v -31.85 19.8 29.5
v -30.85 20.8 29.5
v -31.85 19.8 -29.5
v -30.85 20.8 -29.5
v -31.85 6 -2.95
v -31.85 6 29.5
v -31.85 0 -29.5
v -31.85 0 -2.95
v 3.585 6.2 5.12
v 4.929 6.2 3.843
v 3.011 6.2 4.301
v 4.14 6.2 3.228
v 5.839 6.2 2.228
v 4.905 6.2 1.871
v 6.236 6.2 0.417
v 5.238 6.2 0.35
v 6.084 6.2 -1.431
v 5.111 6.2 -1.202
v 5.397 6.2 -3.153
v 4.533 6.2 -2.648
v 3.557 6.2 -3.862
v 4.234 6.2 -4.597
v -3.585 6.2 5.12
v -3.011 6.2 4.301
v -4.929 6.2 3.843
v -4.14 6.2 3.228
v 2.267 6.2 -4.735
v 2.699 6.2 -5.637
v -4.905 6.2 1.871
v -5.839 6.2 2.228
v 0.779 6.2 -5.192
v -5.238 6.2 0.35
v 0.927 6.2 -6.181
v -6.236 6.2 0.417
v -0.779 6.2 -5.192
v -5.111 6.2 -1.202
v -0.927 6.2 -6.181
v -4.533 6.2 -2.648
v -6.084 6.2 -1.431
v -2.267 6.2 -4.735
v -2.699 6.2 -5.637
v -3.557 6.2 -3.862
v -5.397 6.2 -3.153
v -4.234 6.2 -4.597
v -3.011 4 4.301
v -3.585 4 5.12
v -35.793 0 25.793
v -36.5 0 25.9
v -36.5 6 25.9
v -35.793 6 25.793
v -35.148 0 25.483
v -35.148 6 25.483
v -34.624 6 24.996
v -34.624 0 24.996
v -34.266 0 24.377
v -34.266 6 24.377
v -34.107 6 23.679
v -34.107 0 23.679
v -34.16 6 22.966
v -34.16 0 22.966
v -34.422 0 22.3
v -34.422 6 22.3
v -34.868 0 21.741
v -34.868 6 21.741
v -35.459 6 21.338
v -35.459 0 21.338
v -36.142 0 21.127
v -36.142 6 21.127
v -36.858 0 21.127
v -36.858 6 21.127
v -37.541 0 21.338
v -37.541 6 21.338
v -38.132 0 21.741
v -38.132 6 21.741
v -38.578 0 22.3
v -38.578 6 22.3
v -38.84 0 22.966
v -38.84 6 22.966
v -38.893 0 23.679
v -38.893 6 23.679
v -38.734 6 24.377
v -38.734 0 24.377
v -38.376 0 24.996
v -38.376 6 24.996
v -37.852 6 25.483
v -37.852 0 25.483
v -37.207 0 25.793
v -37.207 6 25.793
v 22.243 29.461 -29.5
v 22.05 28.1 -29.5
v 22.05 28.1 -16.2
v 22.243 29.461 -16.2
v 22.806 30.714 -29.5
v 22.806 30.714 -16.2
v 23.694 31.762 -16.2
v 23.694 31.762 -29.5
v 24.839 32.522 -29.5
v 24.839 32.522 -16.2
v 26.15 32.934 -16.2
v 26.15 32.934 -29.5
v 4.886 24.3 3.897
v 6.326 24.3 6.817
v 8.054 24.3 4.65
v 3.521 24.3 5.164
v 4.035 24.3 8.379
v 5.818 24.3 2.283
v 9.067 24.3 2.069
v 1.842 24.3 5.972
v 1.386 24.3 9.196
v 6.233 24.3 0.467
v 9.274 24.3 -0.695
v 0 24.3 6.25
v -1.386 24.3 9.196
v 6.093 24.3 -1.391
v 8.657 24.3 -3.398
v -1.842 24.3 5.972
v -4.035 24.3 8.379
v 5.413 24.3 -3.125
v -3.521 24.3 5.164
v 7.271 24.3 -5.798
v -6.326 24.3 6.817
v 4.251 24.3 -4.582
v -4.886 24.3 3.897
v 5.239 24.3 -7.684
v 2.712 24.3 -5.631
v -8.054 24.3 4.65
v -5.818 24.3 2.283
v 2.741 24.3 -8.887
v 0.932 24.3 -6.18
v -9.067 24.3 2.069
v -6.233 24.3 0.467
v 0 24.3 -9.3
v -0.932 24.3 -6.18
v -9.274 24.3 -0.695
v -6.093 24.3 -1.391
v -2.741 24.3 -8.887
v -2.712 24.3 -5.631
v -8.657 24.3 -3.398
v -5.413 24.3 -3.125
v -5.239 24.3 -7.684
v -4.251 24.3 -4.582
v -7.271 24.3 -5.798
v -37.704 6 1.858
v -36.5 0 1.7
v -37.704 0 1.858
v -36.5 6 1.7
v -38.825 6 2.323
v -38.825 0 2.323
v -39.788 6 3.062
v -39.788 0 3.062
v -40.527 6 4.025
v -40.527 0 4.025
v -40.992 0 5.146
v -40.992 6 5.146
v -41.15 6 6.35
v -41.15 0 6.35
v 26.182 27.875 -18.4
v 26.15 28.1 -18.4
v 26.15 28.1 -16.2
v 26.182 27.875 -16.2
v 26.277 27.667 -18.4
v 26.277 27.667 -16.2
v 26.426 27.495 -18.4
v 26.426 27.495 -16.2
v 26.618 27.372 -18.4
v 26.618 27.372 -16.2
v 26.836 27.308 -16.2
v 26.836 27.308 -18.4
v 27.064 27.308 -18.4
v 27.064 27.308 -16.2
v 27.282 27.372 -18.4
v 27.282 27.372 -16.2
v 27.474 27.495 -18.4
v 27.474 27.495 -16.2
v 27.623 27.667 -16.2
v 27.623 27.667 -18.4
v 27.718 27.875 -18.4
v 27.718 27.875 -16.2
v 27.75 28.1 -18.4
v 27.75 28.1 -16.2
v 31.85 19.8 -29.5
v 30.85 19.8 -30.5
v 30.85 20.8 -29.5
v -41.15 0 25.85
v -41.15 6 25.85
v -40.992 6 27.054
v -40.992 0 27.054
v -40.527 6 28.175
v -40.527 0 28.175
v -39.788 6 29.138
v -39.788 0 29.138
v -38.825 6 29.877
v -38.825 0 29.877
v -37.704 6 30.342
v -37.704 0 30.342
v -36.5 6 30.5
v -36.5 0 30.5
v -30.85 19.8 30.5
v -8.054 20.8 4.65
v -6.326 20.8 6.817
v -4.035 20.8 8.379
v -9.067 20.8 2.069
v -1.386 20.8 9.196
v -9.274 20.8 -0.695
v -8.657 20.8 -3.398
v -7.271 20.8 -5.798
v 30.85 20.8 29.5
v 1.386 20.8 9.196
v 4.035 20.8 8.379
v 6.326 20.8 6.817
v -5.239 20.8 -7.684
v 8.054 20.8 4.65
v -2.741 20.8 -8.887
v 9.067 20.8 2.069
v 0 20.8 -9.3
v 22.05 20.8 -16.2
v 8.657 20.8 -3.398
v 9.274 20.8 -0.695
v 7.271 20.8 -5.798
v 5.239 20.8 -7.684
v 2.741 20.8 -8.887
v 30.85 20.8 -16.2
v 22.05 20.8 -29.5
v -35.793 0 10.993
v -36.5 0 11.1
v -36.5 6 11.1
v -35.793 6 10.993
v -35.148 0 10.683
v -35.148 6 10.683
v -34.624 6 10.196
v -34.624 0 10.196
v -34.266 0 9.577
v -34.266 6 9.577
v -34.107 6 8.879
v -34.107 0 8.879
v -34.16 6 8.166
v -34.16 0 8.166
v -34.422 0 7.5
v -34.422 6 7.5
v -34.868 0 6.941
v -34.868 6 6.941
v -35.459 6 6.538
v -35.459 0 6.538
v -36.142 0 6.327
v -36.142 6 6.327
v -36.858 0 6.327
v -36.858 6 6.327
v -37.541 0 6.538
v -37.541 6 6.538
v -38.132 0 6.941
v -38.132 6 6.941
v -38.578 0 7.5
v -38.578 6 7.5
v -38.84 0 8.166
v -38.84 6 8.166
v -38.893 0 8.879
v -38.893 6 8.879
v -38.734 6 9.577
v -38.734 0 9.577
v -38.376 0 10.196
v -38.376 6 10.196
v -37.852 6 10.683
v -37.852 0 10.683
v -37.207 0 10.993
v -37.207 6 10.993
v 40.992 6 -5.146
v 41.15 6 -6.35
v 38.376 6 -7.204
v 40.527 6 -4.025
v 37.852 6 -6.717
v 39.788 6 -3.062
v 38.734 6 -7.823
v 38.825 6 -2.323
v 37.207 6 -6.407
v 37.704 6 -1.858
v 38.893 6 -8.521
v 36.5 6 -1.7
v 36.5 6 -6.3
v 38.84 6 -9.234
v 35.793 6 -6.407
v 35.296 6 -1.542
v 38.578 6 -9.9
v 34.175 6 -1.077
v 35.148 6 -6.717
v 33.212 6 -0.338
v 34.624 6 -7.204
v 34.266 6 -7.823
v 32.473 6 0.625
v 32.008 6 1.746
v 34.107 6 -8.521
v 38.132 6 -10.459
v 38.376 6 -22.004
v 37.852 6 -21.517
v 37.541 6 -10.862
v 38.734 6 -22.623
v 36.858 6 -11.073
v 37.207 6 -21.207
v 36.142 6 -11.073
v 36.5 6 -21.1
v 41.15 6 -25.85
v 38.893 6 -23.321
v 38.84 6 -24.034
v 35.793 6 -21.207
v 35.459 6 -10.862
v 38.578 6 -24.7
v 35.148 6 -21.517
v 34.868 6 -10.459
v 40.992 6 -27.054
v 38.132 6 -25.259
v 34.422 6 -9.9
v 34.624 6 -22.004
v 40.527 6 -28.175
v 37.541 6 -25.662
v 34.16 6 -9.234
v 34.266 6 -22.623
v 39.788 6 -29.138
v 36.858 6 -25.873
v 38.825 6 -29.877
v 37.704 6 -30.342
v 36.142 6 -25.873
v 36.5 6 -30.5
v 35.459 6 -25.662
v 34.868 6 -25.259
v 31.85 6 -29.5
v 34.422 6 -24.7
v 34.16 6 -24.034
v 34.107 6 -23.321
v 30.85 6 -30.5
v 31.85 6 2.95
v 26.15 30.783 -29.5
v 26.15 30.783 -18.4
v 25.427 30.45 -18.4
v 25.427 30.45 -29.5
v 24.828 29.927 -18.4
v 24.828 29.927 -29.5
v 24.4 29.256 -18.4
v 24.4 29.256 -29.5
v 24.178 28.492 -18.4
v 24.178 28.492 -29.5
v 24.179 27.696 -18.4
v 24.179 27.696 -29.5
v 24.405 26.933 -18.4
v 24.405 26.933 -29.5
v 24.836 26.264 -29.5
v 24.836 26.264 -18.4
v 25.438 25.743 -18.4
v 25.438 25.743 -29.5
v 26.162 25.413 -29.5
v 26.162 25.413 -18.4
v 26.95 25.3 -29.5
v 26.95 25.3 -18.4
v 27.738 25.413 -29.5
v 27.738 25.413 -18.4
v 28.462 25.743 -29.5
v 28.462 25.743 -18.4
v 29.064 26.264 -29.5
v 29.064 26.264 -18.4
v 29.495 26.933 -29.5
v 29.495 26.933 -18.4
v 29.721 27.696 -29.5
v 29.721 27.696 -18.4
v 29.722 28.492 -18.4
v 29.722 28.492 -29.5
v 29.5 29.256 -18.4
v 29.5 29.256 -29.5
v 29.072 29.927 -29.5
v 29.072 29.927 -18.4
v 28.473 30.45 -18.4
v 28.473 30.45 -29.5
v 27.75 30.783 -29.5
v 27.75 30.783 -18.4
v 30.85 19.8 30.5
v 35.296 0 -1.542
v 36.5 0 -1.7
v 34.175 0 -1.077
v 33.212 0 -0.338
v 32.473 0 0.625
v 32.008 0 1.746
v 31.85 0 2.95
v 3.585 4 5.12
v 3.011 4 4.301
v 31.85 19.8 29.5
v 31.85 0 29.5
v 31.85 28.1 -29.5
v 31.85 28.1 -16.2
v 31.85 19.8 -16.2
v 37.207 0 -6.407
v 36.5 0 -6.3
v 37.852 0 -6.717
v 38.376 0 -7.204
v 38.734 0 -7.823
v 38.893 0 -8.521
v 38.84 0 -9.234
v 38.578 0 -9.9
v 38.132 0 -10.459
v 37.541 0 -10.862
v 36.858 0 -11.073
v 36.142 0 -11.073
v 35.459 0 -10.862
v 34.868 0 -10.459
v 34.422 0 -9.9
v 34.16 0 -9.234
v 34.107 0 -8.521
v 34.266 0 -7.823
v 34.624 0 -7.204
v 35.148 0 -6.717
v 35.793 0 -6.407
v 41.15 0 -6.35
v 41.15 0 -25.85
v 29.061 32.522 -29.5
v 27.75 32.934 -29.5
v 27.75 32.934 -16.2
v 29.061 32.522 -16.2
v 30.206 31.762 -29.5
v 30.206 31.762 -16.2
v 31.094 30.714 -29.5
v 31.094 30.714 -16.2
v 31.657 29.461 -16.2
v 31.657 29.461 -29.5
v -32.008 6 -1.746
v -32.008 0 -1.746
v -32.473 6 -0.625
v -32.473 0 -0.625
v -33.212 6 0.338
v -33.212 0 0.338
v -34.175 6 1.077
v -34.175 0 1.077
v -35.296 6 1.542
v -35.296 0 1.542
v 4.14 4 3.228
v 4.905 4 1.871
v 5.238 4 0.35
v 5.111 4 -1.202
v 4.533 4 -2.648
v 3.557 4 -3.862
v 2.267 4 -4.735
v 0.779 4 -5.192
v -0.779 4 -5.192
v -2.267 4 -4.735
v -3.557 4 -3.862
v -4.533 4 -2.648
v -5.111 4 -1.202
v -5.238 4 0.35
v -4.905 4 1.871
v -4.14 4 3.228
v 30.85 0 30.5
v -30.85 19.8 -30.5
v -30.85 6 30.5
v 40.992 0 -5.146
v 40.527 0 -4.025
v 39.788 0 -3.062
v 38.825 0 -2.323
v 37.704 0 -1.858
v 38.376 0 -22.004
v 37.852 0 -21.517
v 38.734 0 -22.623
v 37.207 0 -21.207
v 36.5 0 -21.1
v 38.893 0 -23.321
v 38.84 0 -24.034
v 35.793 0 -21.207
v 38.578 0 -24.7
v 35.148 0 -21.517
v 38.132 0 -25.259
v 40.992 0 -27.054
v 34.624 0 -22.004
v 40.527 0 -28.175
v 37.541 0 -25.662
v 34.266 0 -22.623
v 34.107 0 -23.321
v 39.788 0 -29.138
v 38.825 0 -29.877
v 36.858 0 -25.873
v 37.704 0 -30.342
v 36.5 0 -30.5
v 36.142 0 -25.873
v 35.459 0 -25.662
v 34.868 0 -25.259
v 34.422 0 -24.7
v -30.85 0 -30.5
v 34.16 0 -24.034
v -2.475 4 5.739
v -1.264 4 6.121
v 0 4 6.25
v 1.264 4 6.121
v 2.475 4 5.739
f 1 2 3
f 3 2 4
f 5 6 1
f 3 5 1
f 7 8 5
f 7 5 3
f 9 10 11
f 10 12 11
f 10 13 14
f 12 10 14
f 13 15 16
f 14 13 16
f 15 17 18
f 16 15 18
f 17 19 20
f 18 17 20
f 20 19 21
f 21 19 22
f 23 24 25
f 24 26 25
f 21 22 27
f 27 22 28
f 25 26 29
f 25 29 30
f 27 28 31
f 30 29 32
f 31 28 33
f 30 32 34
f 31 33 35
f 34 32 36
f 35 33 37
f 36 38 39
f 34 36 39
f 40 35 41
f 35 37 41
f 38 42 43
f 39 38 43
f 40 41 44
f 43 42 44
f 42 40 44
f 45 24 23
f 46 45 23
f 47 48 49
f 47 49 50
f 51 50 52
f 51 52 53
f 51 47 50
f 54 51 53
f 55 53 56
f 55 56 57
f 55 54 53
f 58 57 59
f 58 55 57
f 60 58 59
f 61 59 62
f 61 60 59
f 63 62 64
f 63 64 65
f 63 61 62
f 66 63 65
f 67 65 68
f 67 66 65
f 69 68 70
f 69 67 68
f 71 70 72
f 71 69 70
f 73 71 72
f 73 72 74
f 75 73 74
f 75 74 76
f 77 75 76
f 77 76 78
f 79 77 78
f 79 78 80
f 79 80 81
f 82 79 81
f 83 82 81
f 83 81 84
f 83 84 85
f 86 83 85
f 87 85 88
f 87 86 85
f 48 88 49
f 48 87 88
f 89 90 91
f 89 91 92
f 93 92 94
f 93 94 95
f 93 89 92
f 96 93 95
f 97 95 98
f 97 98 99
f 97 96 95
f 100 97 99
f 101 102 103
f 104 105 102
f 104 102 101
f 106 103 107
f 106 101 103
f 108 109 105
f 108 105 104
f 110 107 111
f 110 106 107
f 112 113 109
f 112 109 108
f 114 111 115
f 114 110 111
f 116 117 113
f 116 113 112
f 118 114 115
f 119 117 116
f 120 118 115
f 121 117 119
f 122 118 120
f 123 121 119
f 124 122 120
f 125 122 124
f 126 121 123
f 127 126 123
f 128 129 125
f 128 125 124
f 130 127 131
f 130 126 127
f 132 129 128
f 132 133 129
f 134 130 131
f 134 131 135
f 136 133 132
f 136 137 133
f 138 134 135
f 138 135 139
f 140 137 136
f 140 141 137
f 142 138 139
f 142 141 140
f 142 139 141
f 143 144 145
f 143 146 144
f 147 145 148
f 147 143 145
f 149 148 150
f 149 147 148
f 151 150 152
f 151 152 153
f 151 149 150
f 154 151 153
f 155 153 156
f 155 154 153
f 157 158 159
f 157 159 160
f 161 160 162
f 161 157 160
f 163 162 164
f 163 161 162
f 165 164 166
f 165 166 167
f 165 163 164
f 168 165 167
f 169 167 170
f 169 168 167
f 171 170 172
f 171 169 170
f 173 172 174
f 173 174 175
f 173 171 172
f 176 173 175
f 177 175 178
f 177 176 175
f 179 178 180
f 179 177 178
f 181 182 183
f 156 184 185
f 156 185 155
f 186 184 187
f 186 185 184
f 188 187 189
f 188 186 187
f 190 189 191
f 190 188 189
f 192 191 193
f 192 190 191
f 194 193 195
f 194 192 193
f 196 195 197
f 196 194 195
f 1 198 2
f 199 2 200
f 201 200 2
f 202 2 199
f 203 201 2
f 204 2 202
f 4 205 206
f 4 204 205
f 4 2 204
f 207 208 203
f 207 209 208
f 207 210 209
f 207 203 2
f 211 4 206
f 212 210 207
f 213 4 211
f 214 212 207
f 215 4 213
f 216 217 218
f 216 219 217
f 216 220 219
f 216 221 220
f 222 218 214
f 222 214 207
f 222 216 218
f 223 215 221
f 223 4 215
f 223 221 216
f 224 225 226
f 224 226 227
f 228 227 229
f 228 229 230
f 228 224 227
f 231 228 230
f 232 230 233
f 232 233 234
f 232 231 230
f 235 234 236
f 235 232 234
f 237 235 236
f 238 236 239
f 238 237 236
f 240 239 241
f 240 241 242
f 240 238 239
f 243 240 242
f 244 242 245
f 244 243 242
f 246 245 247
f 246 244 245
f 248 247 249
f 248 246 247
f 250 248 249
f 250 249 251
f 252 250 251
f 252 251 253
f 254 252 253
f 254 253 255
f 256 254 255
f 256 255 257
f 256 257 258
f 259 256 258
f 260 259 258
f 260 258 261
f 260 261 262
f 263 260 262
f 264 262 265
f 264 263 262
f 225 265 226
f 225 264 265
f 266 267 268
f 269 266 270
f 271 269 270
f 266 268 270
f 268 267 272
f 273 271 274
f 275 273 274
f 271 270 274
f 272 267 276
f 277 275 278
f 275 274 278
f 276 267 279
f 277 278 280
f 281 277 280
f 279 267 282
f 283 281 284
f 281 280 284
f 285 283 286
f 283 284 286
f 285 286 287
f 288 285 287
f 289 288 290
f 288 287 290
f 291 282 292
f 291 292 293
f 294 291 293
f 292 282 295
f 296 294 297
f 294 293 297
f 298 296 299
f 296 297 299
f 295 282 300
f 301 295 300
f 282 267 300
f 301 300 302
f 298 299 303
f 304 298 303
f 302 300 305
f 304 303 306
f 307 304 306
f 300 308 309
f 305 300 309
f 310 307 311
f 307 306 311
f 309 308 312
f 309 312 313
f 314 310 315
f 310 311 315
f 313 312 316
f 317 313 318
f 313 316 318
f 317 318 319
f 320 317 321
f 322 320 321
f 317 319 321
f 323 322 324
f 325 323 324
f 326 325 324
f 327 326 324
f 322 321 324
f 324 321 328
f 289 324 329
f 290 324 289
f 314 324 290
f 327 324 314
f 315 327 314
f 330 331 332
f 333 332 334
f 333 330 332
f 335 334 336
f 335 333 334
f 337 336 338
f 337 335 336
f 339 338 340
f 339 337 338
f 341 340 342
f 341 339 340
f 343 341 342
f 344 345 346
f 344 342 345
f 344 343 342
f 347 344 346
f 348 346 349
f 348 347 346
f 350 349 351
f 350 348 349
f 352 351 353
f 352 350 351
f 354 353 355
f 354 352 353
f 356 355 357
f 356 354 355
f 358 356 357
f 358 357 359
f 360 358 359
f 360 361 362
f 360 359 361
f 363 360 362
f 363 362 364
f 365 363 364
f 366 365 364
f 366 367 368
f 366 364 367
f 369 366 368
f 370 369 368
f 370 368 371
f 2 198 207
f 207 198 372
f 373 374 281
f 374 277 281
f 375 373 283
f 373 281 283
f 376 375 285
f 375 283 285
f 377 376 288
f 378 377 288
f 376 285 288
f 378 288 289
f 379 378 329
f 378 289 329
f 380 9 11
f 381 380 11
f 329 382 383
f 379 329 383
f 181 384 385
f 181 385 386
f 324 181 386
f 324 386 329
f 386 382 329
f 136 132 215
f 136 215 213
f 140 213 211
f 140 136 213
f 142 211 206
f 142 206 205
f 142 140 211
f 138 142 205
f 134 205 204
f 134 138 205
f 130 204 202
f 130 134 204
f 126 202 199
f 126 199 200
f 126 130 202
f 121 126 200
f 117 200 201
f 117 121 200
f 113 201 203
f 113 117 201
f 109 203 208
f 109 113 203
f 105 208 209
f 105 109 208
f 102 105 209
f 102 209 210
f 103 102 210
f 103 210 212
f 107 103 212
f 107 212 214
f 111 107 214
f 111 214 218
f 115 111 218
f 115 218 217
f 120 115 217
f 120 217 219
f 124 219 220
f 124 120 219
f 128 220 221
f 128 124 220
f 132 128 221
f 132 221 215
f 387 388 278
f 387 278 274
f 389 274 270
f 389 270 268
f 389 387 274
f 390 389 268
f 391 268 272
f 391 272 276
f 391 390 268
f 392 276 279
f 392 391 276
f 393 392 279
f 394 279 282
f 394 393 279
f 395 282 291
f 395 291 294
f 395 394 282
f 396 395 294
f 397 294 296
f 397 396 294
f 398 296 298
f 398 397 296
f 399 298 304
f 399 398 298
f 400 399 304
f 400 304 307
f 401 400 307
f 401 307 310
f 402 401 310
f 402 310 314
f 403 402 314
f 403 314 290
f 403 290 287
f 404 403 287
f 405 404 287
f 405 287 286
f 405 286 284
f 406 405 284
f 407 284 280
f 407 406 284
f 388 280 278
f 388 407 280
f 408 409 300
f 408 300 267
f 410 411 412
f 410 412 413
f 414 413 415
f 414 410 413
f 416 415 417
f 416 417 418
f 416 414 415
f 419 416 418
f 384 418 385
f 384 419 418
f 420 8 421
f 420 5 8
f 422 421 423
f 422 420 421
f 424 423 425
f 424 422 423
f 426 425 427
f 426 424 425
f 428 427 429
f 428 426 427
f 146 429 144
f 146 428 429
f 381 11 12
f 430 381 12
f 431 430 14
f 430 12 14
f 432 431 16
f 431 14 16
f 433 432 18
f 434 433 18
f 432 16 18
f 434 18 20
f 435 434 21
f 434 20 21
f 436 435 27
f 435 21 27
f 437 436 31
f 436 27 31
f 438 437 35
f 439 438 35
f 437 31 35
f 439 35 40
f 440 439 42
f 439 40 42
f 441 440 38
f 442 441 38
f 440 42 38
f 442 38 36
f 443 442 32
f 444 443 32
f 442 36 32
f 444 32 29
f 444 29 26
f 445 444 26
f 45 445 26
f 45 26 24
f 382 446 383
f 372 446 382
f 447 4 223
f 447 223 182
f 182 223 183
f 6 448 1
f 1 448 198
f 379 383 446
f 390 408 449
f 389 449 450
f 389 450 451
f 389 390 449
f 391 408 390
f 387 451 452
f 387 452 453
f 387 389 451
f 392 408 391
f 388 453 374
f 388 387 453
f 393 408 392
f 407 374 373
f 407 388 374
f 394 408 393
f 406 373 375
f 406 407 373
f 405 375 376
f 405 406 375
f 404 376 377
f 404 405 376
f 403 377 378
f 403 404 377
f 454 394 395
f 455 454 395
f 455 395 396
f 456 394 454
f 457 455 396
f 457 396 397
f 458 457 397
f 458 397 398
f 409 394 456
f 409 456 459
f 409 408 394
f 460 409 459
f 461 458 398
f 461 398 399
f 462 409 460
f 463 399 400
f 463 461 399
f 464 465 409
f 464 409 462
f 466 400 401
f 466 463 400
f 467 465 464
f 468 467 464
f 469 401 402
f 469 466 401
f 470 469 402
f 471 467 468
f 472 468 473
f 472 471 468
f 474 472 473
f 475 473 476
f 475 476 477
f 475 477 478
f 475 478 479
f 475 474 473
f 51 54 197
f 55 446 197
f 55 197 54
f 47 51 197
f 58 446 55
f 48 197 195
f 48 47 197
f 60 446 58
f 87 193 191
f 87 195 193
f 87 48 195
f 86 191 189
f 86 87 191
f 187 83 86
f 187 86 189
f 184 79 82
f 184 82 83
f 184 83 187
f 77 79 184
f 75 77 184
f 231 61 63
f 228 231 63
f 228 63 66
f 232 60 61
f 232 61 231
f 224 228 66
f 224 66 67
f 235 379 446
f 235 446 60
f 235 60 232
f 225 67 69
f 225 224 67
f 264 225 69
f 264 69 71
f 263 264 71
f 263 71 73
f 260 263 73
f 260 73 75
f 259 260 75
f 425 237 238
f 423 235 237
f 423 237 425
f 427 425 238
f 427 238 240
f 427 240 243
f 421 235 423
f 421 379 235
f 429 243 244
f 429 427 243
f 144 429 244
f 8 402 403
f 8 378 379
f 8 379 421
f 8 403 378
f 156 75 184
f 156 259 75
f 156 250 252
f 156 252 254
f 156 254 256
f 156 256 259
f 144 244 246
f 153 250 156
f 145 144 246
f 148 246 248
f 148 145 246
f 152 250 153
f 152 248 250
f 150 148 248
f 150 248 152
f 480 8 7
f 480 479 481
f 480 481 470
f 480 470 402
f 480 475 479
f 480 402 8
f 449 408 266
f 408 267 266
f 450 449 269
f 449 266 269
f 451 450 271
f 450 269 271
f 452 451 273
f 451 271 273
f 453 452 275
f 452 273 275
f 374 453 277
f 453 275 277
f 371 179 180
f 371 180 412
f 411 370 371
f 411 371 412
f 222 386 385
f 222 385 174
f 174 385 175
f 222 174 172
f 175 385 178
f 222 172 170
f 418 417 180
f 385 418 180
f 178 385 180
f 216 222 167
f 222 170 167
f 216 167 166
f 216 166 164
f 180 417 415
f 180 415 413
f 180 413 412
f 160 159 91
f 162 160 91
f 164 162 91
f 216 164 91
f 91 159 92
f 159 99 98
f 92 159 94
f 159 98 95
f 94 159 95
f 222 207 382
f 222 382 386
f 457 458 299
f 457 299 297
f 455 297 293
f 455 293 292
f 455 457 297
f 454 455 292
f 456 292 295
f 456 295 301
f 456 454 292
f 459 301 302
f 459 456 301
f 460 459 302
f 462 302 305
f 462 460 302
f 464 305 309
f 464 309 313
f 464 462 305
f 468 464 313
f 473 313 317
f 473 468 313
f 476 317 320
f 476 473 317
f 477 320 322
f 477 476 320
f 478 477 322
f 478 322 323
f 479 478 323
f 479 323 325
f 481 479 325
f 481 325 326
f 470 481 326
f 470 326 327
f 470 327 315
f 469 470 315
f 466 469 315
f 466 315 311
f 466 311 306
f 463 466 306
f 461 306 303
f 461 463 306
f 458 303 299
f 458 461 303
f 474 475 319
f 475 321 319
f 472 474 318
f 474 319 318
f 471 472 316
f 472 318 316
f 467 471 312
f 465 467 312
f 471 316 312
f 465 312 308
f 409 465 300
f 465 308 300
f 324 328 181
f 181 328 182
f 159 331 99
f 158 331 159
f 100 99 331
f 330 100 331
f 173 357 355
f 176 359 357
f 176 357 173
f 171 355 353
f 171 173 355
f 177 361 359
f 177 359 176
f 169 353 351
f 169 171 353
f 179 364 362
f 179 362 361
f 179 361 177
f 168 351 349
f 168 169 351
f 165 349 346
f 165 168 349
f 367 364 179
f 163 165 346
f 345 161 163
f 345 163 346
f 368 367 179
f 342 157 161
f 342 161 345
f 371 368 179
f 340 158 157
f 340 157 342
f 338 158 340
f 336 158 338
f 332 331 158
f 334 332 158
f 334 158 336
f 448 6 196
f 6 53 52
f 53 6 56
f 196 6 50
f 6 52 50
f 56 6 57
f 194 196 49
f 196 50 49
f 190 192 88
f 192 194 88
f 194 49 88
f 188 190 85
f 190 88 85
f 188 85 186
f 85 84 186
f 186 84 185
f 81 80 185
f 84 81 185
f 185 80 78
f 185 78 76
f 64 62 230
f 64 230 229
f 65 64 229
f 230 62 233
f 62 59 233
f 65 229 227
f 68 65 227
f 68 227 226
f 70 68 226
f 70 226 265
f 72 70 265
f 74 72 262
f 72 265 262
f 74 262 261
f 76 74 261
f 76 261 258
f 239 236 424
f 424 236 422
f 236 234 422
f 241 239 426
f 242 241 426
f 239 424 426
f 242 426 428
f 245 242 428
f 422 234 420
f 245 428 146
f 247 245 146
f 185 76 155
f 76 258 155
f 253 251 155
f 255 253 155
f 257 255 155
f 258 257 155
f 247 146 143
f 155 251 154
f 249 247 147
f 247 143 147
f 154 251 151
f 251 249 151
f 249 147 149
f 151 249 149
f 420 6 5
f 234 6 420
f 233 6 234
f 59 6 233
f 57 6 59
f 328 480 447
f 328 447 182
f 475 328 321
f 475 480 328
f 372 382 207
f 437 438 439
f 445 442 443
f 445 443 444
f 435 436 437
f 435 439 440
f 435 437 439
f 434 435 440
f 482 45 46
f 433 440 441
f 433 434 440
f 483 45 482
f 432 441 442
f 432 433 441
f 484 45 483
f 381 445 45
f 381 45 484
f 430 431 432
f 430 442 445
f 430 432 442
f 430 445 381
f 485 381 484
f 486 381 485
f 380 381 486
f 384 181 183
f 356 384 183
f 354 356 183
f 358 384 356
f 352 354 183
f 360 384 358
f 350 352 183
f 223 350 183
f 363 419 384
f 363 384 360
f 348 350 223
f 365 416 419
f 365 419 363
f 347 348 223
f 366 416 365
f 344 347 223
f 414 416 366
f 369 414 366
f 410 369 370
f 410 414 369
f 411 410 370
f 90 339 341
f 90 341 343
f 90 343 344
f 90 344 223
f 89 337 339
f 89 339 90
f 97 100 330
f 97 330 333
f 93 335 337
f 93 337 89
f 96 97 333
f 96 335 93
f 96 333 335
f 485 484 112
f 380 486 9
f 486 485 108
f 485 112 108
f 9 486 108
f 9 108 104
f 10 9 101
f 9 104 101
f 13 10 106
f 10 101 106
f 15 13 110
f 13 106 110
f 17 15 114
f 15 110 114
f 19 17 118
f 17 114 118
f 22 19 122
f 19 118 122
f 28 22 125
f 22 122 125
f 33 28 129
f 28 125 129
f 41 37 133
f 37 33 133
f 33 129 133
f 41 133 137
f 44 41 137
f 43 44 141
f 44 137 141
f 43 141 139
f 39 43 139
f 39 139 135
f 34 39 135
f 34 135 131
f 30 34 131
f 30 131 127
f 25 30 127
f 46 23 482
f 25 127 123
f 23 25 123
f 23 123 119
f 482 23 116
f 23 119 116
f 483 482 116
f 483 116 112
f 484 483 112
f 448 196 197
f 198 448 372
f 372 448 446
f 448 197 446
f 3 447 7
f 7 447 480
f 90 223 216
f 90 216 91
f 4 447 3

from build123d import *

# Parameters (mm, degrees)
ESBO_O1_R                = 2.4
RESSALTO_EXTRUS_O1_DEPTH = 6
ESBO_O2_W                = 63.7
ESBO_O2_H                = 61
RESSALTO_EXTRUS_O2_DEPTH = 14.8
CHANFRO1_SIZE            = 1
ESBO_O3_R                = 6.25
CORTE_EXTRUS_O1_DEPTH    = 16.8
FILETE1_R                = 4.65
RESSALTO_EXTRUS_O4_DEPTH = 13.3
RESSALTO_EXTRUS_O5_START = -2.2
RESSALTO_EXTRUS_O5_DEPTH = 2.2
RESSALTO_EXTRUS_O6_START = 2.2
RESSALTO_EXTRUS_O6_DEPTH = 2.2
RESSALTO_EXTRUS_O7_START = 3.5
ESBO_O7_R                = 9.3
ESBO_O7_R_2              = 6.25
RESSALTO_EXTRUS_O7_DEPTH = 3.5


with BuildPart() as part:
    # Esboço1 → Ressalto-extrusão1 (new body)
    with BuildSketch(Plane(origin=(0, 0, 0), x_dir=(1, 0, 0), z_dir=(0, 1, 0))):
        Polygon((-41.15, -1.7), (-31.85, -1.7), (-31.85, 30.5), (41.15, 30.5), (41.15, 1.7), (31.85, 1.7), (31.85, -30.5), (-41.15, -30.5), align=None)
        with Locations(Location((-36.5, -8.7, 0), (0, 0, 270))):
            Circle(ESBO_O1_R, mode=Mode.SUBTRACT)
        with Locations(Location((-36.5, -23.5, 0), (0, 0, 270))):
            Circle(ESBO_O1_R, mode=Mode.SUBTRACT)
        with Locations(Location((36.5, 8.7, 0), (0, 0, 270))):
            Circle(ESBO_O1_R, mode=Mode.SUBTRACT)
        with Locations(Location((36.5, 23.5, 0), (0, 0, 270))):
            Circle(ESBO_O1_R, mode=Mode.SUBTRACT)
    extrude(amount=RESSALTO_EXTRUS_O1_DEPTH)

    # Esboço2 → Ressalto-extrusão2 (add)
    with BuildSketch(Plane(origin=(0, 6, 0), x_dir=(1, 0, 0), z_dir=(0, 1, 0))):
        Rectangle(ESBO_O2_W, ESBO_O2_H)
    extrude(amount=RESSALTO_EXTRUS_O2_DEPTH)

    # Chanfro1
    chanfro1_edges = [part.edges().sort_by_distance(p)[0] for p in [
        (31.85, 10.4, 30.5),
        (-31.85, 10.4, -30.5),
        (0, 20.8, -30.5),
        (31.85, 13.4, -30.5),
        (31.85, 20.8, 0),
        (0, 20.8, 30.5),
        (-31.85, 13.4, 30.5),
        (-31.85, 20.8, 0),
    ]]
    chamfer(chanfro1_edges, length=CHANFRO1_SIZE)

    # Esboço3 → Corte-extrusão1 (cut)
    with BuildSketch(Plane(origin=(0, 20.8, 0), x_dir=(1, 0, 0), z_dir=(0, 1, 0))):
        with Locations(Location((0, 0, 0), (0, 0, 270))):
            Circle(ESBO_O3_R)
    extrude(amount=-CORTE_EXTRUS_O1_DEPTH, mode=Mode.SUBTRACT)

    # Filete1
    filete1_edges = [part.edges().sort_by_distance(p)[0] for p in [
        (41.15, 3, -30.5),
        (41.15, 3, -1.7),
        (31.85, 3, -1.7),
        (-31.85, 3, 1.7),
        (-41.15, 3, 1.7),
        (-41.15, 3, 30.5),
    ]]
    fillet(filete1_edges, radius=FILETE1_R - 0.0001)  # a hair under: the kernel refuses the full size

    # Esboço4 → Ressalto-extrusão4 (add)
    with BuildSketch(Plane(origin=(0, 0, -29.5), x_dir=(-1, 0, 0), z_dir=(0, 0, -1))):
        with BuildLine():
            Line((-31.85, 19.8), (-22.05, 19.8))
            Line((-22.05, 19.8), (-22.05, 28.1))
            ThreePointArc((-22.05, 28.1), (-23.213022612, 31.269384798), (-26.15, 32.934252786))
            Line((-26.15, 32.934252786), (-26.15, 30.783281573))
            ThreePointArc((-26.15, 30.783281573), (-26.95, 25.3), (-27.75, 30.783281573))
            Line((-27.75, 30.783281573), (-27.75, 32.934252786))
            ThreePointArc((-27.75, 32.934252786), (-30.686977388, 31.269384798), (-31.85, 28.1))
            Line((-31.85, 28.1), (-31.85, 19.8))
        make_face()
    extrude(amount=-RESSALTO_EXTRUS_O4_DEPTH)

    # Esboço5 → Ressalto-extrusão5 (add)
    with BuildSketch(Plane.XY.offset(-16.2).offset(RESSALTO_EXTRUS_O5_START)):
        with BuildLine():
            Line((26.15, 30.783281573), (26.15, 28.1))
            ThreePointArc((26.15, 28.1), (26.95, 27.3), (27.75, 28.1))
            Line((27.75, 28.1), (27.75, 30.783281573))
            ThreePointArc((27.75, 30.783281573), (26.95, 25.3), (26.15, 30.783281573))
        make_face()
    extrude(amount=RESSALTO_EXTRUS_O5_DEPTH)

    # Esboço6 → Ressalto-extrusão6 (add)
    with BuildSketch(Plane(origin=(0, 4, 0), x_dir=(1, 0, 0), z_dir=(0, 1, 0)).offset(RESSALTO_EXTRUS_O6_START)):
        with BuildLine():
            Line((-3.011276291, -4.300548233), (-3.584852727, -5.119700277))
            ThreePointArc((-3.584852727, -5.119700277), (0, 6.25), (3.584852727, -5.119700277))
            Line((3.584852727, -5.119700277), (3.011276291, -4.300548233))
            ThreePointArc((3.011276291, -4.300548233), (0, 5.25), (-3.011276291, -4.300548233))
        make_face()
    extrude(amount=-RESSALTO_EXTRUS_O6_DEPTH)

    # Esboço7 → Ressalto-extrusão7 (add)
    with BuildSketch(Plane(origin=(0, 20.8, 0), x_dir=(1, 0, 0), z_dir=(0, 1, 0)).offset(RESSALTO_EXTRUS_O7_START)):
        with Locations(Location((0, 0, 0), (0, 0, 90))):
            Circle(ESBO_O7_R)
        with Locations(Location((0, 0, 0), (0, 0, 270))):
            Circle(ESBO_O7_R_2, mode=Mode.SUBTRACT)
    extrude(amount=-RESSALTO_EXTRUS_O7_DEPTH)


solid = part.part
